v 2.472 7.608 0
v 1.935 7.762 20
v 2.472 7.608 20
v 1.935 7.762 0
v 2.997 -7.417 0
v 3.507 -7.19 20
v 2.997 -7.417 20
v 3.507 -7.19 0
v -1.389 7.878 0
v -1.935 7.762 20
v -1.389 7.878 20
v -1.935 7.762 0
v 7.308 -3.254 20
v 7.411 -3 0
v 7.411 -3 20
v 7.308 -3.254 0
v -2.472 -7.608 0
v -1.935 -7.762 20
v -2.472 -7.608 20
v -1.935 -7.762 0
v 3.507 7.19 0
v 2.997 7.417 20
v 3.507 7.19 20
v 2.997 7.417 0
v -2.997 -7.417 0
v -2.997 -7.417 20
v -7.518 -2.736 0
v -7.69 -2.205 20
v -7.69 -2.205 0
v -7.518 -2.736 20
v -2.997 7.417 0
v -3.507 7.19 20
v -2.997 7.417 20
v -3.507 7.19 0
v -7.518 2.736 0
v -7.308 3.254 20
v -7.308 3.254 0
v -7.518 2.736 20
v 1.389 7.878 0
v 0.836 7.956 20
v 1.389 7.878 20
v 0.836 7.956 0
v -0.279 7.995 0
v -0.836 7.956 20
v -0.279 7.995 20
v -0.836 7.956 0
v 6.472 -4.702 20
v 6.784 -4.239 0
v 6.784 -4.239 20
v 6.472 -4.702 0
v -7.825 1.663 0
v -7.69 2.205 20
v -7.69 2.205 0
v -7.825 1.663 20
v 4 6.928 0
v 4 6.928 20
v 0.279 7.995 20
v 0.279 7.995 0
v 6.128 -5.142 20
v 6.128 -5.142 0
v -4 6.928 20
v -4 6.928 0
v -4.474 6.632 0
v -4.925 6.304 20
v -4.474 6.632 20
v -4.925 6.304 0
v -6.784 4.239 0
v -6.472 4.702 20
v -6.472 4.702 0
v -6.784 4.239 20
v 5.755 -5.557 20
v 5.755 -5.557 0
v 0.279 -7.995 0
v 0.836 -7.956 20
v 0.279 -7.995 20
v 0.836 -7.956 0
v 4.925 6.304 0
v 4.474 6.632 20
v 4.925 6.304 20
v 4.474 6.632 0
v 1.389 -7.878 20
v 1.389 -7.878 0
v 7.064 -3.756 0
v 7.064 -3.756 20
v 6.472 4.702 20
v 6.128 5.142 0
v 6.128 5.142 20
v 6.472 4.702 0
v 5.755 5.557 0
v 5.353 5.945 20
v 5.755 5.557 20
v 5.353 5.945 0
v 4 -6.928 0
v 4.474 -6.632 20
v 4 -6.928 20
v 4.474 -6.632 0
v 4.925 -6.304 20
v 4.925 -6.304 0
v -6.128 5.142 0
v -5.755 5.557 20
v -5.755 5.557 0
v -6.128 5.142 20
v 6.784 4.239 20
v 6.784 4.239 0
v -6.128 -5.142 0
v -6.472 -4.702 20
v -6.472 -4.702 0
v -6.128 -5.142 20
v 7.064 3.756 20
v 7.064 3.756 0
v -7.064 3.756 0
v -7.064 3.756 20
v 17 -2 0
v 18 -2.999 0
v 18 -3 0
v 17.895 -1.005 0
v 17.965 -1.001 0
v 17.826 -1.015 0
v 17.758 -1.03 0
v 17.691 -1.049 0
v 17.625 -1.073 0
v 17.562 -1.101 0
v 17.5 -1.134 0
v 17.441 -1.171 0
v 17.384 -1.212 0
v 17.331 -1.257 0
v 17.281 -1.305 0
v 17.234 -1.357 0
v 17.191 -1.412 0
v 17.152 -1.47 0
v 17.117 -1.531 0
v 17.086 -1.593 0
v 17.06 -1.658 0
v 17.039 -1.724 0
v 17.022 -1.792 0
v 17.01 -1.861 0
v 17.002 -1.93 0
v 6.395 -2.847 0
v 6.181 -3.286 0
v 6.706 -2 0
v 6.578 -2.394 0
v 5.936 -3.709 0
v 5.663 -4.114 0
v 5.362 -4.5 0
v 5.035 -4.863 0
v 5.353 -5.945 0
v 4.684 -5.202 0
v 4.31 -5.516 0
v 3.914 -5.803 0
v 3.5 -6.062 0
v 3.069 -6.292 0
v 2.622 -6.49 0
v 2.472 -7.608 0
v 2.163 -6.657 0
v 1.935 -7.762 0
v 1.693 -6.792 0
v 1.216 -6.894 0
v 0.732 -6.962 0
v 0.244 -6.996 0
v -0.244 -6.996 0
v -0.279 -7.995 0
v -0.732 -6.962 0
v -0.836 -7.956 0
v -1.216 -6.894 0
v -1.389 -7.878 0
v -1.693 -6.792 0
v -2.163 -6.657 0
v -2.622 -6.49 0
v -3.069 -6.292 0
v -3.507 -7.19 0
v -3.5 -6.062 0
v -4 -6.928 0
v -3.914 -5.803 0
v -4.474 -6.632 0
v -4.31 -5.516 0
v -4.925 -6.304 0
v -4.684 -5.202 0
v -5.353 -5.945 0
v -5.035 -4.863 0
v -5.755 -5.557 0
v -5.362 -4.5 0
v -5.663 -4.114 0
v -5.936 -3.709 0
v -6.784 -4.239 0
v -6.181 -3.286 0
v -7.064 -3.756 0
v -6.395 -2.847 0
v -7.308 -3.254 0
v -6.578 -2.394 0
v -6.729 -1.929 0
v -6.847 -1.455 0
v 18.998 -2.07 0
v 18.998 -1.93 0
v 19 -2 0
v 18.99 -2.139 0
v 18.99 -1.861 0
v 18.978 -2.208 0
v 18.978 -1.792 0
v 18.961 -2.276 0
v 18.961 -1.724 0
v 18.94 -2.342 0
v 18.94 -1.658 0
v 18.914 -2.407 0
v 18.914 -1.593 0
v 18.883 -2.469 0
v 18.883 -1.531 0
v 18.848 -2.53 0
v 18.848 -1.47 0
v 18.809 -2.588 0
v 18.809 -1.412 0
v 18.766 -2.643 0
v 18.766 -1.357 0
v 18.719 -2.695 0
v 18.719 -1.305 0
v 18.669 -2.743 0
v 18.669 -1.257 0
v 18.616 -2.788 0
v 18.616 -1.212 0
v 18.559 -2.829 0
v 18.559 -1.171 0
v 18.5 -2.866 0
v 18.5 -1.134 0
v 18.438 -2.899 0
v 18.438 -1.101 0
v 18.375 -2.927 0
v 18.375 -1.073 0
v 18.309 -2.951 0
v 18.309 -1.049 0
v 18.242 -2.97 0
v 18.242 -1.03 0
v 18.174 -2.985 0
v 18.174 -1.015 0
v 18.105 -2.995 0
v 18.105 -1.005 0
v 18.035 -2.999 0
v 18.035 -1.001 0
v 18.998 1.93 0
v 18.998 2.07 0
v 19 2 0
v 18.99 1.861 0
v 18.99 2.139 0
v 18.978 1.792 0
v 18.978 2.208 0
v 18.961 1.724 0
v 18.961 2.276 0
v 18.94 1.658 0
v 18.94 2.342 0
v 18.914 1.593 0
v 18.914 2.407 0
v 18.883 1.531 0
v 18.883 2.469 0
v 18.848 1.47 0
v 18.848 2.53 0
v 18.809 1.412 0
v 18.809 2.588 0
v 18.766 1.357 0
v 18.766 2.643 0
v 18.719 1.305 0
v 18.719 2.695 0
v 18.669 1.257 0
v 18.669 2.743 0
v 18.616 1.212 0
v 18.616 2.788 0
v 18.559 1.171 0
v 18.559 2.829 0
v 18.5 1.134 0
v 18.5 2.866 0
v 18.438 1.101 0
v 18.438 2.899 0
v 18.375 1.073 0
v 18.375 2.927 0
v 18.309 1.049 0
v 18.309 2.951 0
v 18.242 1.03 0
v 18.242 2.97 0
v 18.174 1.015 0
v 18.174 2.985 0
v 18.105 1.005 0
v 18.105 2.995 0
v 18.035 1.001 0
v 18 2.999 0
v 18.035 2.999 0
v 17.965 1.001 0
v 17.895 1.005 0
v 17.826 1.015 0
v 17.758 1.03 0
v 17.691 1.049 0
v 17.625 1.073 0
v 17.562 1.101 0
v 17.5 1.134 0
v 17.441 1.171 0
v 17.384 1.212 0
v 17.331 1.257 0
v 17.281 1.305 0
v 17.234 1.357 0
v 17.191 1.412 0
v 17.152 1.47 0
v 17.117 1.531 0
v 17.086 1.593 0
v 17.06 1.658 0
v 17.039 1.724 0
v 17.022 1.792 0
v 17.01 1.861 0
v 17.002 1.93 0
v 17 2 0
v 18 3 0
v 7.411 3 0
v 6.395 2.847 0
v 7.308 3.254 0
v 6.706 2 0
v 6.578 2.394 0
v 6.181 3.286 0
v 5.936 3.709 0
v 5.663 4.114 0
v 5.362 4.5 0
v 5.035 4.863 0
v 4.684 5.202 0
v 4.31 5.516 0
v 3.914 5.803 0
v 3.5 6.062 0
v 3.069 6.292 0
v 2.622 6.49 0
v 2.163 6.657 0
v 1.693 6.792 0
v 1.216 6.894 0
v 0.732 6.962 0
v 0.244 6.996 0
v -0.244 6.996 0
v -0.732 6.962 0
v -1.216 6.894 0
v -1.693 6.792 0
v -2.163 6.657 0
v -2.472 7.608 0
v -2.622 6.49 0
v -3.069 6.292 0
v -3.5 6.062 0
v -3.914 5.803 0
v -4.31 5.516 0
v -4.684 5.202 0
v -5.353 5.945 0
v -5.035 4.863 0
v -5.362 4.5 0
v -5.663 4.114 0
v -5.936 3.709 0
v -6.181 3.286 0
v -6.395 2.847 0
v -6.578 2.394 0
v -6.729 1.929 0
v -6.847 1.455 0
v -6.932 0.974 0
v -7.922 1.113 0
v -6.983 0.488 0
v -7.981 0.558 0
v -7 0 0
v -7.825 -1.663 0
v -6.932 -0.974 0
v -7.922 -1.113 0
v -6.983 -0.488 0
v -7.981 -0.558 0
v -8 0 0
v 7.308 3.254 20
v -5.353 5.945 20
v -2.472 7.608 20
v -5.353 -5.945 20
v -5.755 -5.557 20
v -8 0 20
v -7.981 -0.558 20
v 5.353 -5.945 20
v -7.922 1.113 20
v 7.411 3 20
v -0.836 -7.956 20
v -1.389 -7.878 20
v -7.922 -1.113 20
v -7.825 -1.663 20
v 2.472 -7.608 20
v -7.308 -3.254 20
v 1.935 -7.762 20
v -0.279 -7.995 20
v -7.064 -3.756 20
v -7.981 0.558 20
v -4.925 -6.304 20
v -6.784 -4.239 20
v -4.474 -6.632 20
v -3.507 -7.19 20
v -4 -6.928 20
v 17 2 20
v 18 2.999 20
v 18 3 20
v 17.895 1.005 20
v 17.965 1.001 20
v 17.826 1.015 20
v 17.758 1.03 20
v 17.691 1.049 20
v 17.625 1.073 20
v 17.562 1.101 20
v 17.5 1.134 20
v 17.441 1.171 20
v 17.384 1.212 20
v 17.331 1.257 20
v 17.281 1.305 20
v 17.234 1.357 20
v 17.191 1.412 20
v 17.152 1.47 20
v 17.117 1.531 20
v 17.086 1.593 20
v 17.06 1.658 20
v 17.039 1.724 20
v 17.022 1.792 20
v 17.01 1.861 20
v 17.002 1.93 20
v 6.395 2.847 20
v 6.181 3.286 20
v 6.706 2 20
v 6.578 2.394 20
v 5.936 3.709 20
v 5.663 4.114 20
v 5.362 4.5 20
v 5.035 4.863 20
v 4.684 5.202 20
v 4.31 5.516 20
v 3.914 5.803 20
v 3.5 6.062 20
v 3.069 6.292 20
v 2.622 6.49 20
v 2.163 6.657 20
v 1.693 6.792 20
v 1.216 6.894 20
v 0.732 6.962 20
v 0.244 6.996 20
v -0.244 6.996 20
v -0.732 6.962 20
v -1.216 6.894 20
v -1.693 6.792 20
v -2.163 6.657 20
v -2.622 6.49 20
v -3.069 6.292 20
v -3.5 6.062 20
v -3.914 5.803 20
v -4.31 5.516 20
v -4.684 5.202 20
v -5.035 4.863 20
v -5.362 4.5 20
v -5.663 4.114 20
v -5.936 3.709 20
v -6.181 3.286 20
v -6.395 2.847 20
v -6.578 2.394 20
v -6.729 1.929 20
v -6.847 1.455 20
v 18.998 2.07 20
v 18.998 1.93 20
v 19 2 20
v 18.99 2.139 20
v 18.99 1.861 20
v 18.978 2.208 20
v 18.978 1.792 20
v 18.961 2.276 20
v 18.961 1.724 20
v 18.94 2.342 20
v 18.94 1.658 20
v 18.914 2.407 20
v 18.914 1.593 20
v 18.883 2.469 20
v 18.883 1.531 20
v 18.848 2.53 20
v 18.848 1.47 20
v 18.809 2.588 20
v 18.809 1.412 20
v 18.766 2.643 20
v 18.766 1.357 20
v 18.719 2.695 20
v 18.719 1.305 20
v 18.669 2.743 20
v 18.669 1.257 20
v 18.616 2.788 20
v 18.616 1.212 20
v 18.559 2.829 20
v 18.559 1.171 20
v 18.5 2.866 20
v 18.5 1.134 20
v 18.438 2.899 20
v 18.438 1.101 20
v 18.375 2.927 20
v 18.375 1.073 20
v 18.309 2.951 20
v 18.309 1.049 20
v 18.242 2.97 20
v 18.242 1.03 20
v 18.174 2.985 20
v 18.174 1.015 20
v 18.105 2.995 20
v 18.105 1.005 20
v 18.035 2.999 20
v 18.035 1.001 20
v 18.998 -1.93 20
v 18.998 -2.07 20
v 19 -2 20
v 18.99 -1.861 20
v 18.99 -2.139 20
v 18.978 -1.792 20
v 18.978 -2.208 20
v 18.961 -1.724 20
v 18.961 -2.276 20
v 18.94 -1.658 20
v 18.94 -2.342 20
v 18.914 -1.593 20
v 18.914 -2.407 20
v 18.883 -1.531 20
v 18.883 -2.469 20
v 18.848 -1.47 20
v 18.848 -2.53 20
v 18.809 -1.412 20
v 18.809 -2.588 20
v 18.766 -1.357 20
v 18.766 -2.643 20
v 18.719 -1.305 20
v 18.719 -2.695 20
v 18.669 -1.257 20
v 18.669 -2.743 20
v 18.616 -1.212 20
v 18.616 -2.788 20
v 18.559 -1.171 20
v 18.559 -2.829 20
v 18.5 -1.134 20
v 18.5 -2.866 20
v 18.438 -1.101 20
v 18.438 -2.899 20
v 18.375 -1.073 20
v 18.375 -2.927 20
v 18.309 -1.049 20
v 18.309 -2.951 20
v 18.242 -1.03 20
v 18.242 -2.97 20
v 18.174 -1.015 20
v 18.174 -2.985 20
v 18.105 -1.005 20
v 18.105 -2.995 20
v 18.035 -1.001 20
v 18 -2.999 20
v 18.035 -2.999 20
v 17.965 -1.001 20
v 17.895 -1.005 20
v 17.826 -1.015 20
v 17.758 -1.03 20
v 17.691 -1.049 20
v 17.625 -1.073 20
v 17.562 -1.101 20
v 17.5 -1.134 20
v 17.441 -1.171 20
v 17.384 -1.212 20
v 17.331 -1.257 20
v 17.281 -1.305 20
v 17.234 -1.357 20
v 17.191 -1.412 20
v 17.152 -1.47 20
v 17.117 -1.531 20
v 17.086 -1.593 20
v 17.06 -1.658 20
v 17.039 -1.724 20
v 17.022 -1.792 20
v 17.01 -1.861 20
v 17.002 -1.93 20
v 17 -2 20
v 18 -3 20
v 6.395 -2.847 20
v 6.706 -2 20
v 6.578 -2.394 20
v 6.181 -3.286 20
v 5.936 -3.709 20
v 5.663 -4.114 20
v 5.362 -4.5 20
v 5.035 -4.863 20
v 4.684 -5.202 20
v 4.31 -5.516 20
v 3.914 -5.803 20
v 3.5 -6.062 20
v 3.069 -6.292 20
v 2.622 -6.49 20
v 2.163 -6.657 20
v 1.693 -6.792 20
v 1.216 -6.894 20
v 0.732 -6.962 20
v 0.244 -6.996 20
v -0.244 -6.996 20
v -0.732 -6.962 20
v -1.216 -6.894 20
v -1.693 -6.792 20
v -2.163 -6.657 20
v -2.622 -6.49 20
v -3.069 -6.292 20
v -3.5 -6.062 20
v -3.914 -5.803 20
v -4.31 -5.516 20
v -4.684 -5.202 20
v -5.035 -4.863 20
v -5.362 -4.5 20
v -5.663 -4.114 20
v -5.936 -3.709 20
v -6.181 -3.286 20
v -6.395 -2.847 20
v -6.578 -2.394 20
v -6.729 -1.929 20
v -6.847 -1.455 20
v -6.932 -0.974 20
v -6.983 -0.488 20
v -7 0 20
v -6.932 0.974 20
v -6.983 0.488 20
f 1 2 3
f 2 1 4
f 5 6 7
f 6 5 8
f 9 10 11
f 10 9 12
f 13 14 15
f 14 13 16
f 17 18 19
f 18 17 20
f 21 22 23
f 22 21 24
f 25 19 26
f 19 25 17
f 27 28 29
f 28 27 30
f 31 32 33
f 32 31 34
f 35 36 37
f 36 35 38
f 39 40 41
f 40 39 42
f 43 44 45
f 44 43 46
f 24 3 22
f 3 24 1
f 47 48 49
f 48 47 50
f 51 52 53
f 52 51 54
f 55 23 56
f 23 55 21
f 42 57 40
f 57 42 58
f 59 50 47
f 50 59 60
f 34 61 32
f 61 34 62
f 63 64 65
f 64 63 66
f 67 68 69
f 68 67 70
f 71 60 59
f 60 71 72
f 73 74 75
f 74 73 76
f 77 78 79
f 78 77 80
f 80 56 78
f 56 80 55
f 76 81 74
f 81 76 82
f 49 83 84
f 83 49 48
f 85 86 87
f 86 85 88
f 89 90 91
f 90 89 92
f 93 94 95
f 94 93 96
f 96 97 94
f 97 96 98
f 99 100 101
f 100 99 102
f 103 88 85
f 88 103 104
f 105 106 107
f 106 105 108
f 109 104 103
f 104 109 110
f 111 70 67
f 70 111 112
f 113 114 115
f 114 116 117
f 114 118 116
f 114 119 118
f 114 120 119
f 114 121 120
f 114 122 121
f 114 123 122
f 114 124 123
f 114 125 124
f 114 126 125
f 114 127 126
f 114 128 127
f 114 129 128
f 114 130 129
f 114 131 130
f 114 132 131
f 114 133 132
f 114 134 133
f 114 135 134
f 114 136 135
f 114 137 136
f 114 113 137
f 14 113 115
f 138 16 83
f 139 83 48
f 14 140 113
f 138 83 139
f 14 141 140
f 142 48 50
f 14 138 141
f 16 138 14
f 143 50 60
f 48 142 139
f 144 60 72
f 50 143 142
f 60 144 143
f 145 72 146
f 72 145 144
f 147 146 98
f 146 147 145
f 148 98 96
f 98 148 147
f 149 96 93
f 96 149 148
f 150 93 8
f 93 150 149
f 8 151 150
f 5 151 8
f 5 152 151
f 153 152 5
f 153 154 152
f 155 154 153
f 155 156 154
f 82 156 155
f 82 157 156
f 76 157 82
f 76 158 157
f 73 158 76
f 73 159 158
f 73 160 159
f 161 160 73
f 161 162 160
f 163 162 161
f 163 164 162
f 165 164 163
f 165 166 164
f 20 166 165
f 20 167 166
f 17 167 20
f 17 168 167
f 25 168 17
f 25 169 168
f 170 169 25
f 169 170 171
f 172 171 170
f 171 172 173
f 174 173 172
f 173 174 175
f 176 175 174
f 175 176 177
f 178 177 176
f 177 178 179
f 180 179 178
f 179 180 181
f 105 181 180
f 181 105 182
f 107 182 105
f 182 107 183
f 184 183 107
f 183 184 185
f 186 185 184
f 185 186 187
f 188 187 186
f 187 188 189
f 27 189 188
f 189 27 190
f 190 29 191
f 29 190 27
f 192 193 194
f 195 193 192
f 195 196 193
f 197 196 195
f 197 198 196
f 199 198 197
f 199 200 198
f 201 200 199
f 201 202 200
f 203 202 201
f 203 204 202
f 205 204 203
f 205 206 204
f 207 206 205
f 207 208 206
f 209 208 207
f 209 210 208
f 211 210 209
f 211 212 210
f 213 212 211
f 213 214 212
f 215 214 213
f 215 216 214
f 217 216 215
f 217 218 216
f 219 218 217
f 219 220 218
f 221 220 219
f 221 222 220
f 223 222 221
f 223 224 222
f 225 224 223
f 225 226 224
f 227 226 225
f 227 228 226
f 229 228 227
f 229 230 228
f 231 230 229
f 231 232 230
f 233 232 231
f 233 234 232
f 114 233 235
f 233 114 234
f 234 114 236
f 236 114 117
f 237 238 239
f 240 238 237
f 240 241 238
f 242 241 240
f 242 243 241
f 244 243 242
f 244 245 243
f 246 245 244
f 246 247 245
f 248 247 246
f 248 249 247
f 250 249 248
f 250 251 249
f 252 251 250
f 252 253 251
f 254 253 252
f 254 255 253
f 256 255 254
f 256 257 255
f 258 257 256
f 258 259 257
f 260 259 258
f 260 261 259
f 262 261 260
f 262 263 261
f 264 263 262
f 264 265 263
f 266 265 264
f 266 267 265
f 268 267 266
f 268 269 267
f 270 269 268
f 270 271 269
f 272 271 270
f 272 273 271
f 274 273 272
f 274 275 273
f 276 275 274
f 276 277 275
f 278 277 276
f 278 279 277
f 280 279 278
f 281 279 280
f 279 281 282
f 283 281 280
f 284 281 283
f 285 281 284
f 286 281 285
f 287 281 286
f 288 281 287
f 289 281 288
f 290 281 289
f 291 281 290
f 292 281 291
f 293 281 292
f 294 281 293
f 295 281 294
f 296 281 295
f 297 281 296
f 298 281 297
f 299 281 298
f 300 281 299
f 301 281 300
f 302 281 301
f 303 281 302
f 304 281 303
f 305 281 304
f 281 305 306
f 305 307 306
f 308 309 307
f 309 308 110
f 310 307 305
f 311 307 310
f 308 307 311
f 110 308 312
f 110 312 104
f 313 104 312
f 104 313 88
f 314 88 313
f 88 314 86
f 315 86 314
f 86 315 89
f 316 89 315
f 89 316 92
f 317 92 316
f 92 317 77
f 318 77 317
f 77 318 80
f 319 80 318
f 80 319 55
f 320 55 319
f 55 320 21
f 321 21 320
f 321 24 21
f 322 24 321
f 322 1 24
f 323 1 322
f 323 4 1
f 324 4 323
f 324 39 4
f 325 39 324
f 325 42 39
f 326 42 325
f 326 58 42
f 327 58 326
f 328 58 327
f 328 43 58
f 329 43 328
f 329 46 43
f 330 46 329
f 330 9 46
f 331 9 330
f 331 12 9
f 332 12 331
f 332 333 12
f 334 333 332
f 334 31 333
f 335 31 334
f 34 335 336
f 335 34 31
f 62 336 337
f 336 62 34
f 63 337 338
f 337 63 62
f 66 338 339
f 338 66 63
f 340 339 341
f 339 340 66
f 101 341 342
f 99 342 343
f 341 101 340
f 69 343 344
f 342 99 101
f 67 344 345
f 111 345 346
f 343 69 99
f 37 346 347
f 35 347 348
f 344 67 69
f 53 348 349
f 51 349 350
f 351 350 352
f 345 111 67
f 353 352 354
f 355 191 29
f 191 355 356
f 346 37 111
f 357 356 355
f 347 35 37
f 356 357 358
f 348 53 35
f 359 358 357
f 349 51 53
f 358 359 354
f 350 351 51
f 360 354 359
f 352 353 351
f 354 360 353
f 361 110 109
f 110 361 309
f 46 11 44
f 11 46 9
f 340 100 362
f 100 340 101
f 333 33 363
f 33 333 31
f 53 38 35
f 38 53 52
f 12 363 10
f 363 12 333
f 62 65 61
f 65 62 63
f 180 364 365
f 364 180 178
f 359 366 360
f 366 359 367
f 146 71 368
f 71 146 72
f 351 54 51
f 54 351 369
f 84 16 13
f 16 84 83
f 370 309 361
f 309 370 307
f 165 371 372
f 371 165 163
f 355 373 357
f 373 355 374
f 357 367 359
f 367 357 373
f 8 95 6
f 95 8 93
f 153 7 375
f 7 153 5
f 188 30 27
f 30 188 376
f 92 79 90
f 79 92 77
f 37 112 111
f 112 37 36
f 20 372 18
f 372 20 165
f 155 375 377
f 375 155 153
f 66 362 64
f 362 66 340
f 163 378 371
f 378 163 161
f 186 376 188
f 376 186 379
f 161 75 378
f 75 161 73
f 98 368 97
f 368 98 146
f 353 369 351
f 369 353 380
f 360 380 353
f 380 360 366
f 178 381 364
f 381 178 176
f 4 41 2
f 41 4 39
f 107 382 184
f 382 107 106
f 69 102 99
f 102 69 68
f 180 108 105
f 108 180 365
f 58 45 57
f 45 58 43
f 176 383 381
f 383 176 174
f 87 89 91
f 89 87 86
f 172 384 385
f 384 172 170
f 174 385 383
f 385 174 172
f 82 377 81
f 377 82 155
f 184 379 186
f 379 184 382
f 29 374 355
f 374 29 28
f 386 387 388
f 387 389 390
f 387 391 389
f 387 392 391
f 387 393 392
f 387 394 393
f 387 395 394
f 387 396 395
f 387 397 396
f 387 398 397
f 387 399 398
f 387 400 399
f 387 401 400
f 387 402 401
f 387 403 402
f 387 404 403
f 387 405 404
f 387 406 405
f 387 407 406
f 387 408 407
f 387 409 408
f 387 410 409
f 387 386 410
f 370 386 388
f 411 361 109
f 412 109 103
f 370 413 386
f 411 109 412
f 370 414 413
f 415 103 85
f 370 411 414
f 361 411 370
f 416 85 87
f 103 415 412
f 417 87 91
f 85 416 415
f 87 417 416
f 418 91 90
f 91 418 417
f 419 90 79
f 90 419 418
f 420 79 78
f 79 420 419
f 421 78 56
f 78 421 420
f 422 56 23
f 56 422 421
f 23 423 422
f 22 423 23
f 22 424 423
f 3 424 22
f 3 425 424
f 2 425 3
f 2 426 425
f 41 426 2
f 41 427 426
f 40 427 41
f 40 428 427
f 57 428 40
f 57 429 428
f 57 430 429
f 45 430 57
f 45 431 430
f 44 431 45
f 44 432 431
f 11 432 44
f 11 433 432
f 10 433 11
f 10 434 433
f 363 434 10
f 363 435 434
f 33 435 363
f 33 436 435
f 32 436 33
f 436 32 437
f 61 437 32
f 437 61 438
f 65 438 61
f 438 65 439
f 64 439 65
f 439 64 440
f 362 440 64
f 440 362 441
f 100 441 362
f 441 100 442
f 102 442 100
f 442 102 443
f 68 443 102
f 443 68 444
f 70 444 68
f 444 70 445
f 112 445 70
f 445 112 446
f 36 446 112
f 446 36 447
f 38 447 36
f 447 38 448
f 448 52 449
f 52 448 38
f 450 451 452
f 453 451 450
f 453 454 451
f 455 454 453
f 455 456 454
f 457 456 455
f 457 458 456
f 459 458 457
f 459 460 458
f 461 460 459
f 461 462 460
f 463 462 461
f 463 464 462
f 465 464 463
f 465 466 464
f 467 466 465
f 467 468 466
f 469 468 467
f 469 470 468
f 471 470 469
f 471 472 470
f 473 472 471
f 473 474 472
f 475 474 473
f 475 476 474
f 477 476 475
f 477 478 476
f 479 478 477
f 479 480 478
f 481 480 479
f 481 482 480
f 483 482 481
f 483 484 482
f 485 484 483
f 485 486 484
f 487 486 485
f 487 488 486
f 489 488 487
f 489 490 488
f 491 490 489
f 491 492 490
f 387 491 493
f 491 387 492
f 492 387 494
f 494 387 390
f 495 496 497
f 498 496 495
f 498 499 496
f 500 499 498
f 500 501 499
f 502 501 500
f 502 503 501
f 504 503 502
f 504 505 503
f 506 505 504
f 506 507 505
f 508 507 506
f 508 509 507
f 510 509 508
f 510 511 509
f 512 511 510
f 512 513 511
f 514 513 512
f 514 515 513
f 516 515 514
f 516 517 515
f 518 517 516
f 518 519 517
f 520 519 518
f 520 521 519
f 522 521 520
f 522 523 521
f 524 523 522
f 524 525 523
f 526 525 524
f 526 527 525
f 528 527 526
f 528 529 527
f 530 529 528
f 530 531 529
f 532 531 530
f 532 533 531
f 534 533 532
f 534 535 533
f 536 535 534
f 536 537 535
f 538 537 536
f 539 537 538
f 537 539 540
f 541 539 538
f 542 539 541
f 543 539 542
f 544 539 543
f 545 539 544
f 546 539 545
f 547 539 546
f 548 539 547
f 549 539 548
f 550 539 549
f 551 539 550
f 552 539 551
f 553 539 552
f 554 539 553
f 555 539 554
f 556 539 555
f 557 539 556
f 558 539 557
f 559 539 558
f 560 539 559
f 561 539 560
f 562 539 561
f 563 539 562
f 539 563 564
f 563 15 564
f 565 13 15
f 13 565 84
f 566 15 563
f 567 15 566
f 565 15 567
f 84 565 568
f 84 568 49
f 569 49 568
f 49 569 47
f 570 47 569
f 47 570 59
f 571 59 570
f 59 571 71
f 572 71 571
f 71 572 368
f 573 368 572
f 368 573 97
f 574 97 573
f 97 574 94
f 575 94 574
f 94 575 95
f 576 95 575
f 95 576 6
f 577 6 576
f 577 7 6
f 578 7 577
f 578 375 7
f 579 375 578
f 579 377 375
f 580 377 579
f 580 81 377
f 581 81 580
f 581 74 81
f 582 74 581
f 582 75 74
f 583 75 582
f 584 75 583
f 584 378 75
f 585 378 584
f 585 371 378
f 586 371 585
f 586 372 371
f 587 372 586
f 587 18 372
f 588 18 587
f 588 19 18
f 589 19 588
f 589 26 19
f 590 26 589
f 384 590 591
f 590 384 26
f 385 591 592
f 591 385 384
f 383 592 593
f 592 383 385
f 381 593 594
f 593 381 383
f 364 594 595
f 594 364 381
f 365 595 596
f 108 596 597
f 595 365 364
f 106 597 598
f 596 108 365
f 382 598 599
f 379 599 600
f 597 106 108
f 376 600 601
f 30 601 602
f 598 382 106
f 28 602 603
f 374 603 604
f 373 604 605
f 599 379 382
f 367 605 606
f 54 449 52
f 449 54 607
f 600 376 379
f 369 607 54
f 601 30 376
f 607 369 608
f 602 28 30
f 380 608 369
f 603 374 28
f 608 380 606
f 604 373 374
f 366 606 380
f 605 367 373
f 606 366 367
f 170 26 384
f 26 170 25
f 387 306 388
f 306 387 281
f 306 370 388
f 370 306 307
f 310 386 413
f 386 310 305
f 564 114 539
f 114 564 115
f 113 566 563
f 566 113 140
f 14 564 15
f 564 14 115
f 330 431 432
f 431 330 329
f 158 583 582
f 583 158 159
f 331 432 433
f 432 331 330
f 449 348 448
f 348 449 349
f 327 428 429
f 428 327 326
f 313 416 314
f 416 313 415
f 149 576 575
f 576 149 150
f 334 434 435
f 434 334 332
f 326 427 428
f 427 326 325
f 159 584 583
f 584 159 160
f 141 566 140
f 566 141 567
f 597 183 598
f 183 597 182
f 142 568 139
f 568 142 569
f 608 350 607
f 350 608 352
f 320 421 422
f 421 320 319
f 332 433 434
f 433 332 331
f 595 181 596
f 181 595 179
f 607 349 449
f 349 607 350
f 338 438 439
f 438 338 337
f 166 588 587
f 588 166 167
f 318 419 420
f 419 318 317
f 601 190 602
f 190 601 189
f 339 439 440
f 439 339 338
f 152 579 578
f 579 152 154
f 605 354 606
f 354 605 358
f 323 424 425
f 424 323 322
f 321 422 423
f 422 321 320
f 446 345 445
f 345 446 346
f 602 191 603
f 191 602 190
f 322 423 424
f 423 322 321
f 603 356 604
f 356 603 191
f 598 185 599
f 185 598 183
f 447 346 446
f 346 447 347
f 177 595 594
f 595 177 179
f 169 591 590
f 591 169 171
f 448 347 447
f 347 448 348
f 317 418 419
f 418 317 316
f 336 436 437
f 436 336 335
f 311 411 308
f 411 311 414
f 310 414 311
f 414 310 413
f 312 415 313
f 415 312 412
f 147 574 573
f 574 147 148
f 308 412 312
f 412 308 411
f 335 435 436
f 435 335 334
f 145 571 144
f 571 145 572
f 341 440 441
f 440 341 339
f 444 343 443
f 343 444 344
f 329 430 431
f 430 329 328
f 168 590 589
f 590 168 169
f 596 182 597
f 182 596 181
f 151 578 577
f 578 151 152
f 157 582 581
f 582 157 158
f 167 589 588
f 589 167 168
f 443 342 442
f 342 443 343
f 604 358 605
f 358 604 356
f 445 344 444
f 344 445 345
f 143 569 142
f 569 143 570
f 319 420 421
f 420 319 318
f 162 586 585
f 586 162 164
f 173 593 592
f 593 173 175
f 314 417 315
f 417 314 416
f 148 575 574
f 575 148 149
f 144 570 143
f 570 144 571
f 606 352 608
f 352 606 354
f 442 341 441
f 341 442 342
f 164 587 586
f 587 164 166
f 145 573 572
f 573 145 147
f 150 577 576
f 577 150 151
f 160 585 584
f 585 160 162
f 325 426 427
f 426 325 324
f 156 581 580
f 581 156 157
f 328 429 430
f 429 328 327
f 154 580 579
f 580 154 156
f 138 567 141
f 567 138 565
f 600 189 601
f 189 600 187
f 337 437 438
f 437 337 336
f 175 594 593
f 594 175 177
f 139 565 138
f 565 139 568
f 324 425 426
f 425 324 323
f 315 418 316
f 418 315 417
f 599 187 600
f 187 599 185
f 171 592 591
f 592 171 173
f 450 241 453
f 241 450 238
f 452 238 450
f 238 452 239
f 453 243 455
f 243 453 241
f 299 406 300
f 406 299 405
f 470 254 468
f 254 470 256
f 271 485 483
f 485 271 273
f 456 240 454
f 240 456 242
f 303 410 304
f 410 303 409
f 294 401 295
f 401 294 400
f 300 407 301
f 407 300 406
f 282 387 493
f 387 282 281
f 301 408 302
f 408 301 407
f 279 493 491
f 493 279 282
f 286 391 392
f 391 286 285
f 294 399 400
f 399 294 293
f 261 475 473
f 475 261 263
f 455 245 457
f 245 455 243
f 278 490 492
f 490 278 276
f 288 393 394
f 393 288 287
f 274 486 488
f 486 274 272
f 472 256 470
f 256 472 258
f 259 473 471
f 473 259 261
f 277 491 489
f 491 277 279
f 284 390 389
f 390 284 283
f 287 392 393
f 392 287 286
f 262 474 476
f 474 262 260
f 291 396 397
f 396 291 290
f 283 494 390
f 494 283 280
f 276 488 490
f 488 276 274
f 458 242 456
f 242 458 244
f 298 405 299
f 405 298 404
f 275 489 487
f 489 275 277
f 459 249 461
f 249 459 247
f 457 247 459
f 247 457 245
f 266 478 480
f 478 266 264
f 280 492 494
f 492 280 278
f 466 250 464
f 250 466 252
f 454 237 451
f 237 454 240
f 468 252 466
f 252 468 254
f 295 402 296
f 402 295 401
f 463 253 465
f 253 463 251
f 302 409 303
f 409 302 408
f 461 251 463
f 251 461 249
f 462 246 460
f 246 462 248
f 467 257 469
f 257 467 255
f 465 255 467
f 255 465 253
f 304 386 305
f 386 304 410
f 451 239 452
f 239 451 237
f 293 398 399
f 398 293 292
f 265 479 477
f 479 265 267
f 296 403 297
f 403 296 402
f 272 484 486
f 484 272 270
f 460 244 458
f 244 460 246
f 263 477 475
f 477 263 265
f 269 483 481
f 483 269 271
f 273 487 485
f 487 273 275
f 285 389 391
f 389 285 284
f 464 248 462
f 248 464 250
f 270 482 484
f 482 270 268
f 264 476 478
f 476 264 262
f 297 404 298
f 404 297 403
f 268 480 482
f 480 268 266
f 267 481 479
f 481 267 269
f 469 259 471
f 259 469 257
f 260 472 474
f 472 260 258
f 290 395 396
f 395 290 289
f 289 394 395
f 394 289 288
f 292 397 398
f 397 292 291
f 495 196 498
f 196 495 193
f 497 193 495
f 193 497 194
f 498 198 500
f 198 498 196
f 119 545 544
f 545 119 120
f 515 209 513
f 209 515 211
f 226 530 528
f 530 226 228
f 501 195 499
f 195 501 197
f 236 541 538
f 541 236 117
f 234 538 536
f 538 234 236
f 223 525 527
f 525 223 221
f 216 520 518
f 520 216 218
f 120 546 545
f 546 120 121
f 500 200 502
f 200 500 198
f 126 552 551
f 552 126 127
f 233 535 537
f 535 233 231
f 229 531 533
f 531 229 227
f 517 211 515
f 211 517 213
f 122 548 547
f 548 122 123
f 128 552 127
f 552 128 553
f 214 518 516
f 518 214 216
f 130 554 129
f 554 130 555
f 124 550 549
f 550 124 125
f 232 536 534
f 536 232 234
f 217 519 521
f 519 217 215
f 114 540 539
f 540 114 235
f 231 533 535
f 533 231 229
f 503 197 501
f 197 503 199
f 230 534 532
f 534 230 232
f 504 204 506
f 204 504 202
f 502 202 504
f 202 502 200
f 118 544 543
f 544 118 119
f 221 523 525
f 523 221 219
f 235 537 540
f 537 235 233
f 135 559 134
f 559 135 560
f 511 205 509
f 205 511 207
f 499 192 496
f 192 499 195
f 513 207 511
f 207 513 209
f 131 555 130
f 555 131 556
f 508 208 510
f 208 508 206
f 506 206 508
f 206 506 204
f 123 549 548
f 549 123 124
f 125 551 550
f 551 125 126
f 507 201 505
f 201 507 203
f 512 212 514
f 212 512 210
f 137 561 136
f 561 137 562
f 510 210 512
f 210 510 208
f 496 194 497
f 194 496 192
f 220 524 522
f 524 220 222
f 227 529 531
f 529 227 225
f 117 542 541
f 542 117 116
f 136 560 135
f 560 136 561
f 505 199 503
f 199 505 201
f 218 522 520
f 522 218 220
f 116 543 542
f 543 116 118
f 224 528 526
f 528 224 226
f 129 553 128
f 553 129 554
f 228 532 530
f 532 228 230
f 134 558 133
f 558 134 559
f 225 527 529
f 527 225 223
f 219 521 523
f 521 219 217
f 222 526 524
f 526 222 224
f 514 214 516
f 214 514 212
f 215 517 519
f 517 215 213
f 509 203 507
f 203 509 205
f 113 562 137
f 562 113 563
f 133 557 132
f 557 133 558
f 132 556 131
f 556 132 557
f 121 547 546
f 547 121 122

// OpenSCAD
height=20;
spacing=2;
$fn=90;
difference() {
    union() {
        cylinder(h=height, d=16);
        translate([0,spacing,0]) cube([18,1,height]);
        translate([0,-spacing-1,0]) cube([18,1,height]);
    }
    cylinder(h=height, d=14);
    translate([0,-spacing,0]) cube([height*2,spacing*2,height*2]);
}
translate([18,spacing,0]) cylinder(h=height, d=2);
translate([18,-spacing,0]) cylinder(h=height, d=2);
